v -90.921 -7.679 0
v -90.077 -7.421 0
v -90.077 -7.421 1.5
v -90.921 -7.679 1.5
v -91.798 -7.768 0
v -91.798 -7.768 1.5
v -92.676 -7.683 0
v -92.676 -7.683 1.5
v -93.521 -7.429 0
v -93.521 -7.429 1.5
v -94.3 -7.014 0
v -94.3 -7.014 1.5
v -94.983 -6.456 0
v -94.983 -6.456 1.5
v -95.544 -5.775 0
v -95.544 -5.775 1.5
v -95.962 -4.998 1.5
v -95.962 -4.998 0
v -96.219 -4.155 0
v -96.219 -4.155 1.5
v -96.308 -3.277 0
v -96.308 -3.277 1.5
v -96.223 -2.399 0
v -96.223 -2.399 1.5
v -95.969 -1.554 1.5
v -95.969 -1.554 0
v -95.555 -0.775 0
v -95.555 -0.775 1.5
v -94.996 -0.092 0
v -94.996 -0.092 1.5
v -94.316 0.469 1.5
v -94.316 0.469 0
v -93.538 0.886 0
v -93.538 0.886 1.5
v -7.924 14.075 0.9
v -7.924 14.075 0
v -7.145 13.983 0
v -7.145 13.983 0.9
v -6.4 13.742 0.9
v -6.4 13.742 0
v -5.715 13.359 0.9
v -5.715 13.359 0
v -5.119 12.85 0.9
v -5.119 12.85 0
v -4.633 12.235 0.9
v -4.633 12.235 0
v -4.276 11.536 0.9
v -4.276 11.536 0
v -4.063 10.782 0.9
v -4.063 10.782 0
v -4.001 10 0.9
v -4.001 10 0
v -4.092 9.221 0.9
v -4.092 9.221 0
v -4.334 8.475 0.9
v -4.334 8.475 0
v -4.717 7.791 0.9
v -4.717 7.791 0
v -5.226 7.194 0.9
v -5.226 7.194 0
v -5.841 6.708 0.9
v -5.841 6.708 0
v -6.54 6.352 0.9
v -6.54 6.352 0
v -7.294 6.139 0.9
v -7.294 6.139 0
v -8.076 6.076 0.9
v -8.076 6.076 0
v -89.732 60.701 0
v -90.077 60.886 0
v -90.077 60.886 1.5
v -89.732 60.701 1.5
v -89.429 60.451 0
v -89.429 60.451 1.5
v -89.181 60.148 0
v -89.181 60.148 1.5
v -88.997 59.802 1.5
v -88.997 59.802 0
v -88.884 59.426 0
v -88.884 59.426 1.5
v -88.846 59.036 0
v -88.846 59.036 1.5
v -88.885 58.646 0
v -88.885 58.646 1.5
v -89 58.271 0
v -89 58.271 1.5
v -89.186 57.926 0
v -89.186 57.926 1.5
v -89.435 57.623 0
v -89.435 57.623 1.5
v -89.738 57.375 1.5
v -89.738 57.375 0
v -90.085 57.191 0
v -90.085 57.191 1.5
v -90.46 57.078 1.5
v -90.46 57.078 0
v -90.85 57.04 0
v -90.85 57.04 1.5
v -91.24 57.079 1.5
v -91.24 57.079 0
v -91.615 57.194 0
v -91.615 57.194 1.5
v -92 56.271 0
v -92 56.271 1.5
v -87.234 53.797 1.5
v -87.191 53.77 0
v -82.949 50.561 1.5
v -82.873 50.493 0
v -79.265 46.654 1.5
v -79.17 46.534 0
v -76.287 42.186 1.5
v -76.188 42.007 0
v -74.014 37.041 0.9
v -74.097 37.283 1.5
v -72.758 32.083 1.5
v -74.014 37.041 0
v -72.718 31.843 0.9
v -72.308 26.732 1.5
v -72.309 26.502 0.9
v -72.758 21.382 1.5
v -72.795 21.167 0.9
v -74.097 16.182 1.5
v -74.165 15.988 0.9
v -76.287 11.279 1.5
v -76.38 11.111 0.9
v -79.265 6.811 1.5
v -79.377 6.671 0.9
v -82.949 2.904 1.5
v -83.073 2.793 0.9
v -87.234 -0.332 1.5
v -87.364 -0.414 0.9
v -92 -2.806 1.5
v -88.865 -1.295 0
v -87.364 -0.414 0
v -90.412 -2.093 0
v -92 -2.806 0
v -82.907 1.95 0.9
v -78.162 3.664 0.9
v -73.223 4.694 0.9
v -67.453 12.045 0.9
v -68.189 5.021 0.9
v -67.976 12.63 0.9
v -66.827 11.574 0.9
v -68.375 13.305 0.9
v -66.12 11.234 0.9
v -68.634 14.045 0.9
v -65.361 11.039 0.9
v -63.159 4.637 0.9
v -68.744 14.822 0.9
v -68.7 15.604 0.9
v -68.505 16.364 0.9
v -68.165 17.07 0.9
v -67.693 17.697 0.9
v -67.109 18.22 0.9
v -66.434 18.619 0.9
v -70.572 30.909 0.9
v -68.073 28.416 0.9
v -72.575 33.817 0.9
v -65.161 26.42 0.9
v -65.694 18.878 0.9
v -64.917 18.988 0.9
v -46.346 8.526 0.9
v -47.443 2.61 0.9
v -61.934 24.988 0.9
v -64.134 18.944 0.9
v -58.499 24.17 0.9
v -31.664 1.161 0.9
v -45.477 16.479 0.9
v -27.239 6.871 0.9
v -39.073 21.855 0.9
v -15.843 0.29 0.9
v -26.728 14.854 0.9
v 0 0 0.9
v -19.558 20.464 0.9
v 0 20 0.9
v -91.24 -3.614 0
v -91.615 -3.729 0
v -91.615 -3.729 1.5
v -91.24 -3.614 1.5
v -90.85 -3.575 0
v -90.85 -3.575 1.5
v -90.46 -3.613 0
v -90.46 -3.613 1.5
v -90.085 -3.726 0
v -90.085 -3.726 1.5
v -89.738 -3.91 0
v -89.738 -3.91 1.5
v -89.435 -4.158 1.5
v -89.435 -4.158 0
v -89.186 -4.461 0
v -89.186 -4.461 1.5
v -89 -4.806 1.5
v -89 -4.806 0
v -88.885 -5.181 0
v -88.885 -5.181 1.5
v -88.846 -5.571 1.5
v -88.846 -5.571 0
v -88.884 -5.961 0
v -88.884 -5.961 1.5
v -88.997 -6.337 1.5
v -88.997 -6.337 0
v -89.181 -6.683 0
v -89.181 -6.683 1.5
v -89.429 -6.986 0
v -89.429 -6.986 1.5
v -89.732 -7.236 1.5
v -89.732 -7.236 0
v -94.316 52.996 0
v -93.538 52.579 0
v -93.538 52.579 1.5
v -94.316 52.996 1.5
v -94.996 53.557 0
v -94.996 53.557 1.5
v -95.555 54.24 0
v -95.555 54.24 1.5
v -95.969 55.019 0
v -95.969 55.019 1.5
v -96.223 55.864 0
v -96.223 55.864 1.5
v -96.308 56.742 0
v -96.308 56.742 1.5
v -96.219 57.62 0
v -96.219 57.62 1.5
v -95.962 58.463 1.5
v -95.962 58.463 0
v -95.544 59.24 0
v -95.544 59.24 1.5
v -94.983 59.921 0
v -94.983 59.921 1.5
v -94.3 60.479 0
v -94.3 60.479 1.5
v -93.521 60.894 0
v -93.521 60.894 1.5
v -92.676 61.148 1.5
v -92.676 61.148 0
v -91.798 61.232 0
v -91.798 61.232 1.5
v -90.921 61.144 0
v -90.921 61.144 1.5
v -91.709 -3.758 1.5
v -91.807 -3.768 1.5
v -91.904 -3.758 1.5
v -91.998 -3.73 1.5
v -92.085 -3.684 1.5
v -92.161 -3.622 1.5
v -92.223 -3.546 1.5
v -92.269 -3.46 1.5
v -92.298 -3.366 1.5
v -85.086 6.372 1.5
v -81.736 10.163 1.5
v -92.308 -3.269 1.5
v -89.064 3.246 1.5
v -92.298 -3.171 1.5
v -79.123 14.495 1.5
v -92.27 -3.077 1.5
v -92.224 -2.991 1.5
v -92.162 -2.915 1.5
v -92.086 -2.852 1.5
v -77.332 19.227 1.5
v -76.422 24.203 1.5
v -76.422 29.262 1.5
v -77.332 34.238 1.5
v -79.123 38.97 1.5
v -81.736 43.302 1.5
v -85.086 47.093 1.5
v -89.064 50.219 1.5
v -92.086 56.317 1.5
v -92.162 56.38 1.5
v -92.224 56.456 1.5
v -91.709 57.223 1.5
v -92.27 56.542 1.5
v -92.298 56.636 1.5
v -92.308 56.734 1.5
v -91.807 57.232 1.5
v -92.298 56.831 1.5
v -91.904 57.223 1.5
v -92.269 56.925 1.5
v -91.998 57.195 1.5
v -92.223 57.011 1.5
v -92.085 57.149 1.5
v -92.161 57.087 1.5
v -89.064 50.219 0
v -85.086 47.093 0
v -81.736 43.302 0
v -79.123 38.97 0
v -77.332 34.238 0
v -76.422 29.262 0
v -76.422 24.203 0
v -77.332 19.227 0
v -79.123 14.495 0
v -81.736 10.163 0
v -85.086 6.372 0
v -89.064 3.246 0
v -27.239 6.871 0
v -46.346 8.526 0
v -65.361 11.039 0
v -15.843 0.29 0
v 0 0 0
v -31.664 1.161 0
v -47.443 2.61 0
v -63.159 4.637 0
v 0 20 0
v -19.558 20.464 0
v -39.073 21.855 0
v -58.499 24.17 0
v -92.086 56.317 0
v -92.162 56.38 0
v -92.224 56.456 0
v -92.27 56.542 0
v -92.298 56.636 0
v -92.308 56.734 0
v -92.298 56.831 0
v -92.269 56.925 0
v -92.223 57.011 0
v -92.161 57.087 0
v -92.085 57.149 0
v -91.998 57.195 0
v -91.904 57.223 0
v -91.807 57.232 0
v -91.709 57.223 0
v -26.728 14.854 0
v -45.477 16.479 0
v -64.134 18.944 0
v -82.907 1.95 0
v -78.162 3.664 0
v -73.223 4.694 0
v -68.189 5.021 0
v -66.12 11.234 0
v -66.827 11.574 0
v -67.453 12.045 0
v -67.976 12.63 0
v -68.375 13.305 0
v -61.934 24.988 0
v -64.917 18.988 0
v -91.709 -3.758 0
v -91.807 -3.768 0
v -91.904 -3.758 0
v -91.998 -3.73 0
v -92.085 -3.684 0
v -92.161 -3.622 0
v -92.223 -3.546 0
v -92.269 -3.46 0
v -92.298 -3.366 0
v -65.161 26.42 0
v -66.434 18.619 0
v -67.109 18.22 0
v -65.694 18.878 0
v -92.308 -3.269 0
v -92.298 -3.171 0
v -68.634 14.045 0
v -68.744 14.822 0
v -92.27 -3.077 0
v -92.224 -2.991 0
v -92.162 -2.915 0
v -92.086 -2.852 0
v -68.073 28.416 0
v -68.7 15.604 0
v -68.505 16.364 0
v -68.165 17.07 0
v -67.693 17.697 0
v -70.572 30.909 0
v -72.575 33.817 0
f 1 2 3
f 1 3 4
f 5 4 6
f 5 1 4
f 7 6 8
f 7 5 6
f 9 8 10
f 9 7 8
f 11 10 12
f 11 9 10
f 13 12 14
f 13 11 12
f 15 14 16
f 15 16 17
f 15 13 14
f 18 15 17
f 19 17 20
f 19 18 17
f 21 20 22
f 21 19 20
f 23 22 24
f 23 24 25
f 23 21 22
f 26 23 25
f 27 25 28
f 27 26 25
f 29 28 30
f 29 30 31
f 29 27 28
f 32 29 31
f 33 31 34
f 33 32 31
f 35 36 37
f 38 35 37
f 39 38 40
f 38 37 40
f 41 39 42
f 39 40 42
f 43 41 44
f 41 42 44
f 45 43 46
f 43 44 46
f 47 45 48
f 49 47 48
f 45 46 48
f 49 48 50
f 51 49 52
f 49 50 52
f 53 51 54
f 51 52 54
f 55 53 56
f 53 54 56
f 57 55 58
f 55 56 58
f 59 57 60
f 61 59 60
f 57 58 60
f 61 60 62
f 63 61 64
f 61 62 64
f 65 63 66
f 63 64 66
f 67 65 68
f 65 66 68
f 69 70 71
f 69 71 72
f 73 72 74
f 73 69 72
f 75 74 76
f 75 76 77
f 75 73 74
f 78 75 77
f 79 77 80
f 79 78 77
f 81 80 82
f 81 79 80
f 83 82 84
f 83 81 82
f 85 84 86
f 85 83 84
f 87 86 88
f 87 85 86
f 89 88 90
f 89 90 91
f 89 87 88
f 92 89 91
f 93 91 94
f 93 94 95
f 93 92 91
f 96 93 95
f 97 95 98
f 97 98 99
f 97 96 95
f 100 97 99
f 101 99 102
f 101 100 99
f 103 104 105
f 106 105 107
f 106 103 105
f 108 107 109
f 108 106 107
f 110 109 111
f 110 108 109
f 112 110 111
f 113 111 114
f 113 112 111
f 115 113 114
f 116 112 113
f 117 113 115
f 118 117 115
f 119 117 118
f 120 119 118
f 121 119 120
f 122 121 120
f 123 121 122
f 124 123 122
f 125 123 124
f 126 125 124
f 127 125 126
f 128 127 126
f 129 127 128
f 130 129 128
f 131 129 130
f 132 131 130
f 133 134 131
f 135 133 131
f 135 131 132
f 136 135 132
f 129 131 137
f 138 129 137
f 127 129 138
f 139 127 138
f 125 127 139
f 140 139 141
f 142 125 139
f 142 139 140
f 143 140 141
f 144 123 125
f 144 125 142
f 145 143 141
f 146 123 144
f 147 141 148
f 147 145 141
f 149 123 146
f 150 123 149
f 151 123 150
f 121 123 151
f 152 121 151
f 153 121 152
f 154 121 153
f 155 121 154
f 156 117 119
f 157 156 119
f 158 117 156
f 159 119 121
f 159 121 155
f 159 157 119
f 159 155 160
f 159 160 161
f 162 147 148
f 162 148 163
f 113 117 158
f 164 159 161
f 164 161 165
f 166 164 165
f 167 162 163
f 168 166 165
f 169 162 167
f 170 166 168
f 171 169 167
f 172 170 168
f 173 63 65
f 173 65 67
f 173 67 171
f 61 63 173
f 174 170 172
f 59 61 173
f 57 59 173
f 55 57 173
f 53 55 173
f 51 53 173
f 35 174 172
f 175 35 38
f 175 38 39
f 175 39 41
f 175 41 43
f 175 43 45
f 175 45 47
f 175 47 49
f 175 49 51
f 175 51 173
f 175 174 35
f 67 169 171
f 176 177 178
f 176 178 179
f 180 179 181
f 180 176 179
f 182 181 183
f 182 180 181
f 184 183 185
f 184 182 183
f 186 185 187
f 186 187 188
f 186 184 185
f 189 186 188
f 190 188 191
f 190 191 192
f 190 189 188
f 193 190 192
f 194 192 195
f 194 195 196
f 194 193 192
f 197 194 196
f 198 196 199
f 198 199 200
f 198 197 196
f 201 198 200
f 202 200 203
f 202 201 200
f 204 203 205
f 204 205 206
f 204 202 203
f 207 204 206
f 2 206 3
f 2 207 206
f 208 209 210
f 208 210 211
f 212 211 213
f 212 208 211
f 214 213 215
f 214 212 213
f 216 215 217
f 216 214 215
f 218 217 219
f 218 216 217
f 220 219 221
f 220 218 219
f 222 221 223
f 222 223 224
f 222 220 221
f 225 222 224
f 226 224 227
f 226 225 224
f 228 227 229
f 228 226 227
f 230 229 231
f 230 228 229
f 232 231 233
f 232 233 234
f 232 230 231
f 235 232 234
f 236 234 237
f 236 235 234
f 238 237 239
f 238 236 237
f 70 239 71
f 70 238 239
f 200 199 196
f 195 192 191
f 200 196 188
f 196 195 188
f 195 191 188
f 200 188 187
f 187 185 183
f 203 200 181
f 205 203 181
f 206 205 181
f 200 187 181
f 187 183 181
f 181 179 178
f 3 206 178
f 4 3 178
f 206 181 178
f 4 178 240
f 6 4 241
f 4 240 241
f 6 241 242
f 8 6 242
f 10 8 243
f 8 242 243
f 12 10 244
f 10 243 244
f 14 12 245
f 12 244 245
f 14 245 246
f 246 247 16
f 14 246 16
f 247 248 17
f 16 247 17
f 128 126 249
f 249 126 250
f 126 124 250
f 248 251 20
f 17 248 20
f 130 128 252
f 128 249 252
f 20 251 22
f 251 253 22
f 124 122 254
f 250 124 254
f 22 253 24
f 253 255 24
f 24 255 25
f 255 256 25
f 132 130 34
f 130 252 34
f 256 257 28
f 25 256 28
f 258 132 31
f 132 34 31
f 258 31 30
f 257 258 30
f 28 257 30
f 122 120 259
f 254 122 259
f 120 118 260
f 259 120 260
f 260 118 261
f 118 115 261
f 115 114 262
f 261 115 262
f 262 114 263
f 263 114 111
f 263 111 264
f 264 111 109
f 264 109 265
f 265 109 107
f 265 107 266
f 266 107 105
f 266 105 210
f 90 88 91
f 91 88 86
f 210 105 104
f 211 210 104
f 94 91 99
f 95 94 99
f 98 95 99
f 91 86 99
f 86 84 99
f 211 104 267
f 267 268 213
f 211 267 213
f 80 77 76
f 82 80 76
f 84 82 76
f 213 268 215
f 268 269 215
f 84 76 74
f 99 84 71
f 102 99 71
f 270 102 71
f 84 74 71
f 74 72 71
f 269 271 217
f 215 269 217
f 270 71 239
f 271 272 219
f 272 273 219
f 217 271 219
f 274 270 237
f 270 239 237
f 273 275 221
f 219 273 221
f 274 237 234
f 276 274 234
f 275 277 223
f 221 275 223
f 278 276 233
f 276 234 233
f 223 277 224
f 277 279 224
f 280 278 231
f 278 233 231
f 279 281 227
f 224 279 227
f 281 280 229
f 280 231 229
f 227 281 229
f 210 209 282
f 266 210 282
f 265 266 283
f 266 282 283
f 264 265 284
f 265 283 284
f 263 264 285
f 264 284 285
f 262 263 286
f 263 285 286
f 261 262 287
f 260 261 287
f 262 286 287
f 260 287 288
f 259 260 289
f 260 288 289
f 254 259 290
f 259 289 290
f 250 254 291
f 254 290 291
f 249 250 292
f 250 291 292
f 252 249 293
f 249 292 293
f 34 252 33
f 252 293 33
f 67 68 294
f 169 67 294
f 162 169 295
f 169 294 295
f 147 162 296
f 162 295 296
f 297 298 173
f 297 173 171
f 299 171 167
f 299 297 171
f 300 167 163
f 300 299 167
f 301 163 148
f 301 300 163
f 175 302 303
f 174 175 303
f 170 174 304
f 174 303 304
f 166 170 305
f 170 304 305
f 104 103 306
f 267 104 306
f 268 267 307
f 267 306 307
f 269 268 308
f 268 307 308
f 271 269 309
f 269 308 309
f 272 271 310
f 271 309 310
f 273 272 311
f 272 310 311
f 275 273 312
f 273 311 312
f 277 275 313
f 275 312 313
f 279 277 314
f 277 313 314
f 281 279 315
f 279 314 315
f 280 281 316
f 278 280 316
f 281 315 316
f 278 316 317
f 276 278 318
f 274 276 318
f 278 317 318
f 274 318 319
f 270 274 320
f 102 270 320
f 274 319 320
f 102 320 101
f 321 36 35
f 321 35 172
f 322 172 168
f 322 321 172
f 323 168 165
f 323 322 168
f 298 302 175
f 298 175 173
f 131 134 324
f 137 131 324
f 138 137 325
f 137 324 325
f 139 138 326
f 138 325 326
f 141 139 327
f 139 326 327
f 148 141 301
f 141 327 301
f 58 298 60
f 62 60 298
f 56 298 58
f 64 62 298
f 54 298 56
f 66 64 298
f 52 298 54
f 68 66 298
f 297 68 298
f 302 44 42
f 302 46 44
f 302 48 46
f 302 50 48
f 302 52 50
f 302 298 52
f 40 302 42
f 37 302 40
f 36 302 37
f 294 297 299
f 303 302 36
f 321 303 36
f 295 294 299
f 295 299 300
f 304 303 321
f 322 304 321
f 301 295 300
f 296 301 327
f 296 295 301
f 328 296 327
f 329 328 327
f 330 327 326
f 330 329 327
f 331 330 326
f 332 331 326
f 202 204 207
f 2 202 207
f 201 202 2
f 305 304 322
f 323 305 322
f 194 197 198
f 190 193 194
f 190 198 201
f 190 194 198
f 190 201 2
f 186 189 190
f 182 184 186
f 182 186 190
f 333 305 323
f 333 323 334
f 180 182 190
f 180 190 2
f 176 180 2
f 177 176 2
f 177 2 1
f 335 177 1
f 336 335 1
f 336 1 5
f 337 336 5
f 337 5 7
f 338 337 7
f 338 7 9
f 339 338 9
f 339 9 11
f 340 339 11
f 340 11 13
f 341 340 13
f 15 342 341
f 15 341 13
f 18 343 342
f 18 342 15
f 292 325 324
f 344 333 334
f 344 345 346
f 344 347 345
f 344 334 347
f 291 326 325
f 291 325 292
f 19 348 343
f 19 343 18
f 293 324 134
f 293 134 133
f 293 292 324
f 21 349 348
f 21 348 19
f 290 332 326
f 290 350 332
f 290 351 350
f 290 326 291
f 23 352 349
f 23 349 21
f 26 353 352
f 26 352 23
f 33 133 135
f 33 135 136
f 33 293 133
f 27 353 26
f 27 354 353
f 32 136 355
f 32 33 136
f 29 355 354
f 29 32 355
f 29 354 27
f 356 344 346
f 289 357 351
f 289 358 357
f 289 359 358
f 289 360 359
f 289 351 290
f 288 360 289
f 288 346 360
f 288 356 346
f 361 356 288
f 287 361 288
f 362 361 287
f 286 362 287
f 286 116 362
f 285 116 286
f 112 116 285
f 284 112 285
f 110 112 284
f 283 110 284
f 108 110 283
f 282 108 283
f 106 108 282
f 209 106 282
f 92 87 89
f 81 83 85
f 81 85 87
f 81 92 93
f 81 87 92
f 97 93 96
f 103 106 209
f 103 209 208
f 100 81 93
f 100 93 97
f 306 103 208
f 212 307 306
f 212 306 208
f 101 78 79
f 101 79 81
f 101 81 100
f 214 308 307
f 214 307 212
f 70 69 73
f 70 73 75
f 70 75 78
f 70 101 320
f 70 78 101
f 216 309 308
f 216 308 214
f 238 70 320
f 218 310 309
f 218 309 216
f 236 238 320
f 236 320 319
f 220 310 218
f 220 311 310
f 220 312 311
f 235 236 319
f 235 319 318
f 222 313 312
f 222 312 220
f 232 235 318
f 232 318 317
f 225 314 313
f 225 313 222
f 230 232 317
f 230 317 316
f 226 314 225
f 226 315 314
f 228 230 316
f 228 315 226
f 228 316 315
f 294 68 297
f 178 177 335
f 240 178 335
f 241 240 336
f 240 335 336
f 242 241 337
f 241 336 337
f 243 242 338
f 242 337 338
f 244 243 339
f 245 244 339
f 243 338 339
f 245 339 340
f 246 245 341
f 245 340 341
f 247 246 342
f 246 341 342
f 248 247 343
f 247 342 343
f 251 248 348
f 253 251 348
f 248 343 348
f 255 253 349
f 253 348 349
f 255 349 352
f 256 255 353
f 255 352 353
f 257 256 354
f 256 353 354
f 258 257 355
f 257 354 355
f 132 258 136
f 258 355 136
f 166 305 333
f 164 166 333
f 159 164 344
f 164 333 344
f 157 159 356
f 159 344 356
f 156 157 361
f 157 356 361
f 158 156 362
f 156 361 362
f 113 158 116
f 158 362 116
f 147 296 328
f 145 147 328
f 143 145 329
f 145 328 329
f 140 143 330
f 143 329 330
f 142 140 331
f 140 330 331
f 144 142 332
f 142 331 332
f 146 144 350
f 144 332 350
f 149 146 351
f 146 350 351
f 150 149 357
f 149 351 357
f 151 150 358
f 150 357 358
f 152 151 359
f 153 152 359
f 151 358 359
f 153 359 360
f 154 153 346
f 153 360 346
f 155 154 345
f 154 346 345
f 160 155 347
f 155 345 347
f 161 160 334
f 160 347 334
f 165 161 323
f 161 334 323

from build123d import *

# Parameters (mm, degrees)
PAD_DEPTH    = 1.5
PAD001_DEPTH = 0.9


with BuildPart() as body:
    # Sketch → Pad (new body)
    with BuildSketch(Plane.XY):
        with BuildLine():
            ThreePointArc((92, 56.2709215446), (72.3076923077, 26.7324600061), (92, -2.8060015324))
            ThreePointArc((91.6153846154, -3.7290784554), (92.2692307692, -3.4598476862), (92, -2.8060015324))
            ThreePointArc((91.6153846154, -3.7290784554), (89, -4.8060015324), (90.0769230769, -7.4213861477))
            ThreePointArc((90.0769230769, -7.4213861477), (95.9615384615, -4.9983092247), (93.5384615385, 0.88630616))
            ThreePointArc((93.5384615385, 52.5786138523), (76.3076923077, 26.7324600061), (93.5384615385, 0.88630616))
            ThreePointArc((93.5384615385, 52.5786138523), (95.9615384615, 58.4632292369), (90.0769230769, 60.88630616))
            ThreePointArc((90.0769230769, 60.88630616), (89, 58.2709215446), (91.6153846154, 57.1939984676))
            ThreePointArc((92, 56.2709215446), (92.2692307692, 56.9247676984), (91.6153846154, 57.1939984676))
        make_face()
    extrude(amount=PAD_DEPTH)

    # Sketch001 → Pad001 (join)
    with BuildSketch(Plane.XY):
        with BuildLine():
            ThreePointArc((0, 20), (29.323857539, 21.0437591192), (58.4992960523, 24.1697536209))
            ThreePointArc((58.4992960523, 24.1697536209), (68.0731220762, 28.4157701053), (74.013620455, 37.0411558783))
            ThreePointArc((74.013620455, 37.0411558783), (74.1652431283, 15.9884962371), (87.3639974769, -0.4136484716))
            ThreePointArc((87.3639974769, -0.4136484716), (75.7108888805, 4.2658460628), (63.1588059736, 4.6370922787))
            ThreePointArc((0, 0), (31.664401924, 1.1608311192), (63.1588059736, 4.6370922787))
            Line((0, 20), (0, 0))
        make_face()
        with BuildLine():
            ThreePointArc((8.0757502279, 6.0764743472), (36.8018825362, 7.5909701802), (65.3605544983, 11.0386695272))
            ThreePointArc((65.3605544983, 11.0386695272), (68.7002124728, 15.6044864983), (64.1343955017, 18.9441444728))
            ThreePointArc((7.9242497721, 14.0750396943), (36.1114820384, 15.5611237014), (64.1343955017, 18.9441444728))
            ThreePointArc((7.9242497721, 14.0750396943), (4.0007173264, 10.0000067928), (8.0757502279, 6.0764743472))
        make_face(mode=Mode.SUBTRACT)
    extrude(amount=PAD001_DEPTH)


with BuildPart() as part_mirroring:
    # Part__Mirroring: instance of Body
    add(body.part.mirror(Plane(origin=(0, 0, 0), x_dir=(0, -1, 0), z_dir=(1, 0, 0))))


solid = part_mirroring.part
